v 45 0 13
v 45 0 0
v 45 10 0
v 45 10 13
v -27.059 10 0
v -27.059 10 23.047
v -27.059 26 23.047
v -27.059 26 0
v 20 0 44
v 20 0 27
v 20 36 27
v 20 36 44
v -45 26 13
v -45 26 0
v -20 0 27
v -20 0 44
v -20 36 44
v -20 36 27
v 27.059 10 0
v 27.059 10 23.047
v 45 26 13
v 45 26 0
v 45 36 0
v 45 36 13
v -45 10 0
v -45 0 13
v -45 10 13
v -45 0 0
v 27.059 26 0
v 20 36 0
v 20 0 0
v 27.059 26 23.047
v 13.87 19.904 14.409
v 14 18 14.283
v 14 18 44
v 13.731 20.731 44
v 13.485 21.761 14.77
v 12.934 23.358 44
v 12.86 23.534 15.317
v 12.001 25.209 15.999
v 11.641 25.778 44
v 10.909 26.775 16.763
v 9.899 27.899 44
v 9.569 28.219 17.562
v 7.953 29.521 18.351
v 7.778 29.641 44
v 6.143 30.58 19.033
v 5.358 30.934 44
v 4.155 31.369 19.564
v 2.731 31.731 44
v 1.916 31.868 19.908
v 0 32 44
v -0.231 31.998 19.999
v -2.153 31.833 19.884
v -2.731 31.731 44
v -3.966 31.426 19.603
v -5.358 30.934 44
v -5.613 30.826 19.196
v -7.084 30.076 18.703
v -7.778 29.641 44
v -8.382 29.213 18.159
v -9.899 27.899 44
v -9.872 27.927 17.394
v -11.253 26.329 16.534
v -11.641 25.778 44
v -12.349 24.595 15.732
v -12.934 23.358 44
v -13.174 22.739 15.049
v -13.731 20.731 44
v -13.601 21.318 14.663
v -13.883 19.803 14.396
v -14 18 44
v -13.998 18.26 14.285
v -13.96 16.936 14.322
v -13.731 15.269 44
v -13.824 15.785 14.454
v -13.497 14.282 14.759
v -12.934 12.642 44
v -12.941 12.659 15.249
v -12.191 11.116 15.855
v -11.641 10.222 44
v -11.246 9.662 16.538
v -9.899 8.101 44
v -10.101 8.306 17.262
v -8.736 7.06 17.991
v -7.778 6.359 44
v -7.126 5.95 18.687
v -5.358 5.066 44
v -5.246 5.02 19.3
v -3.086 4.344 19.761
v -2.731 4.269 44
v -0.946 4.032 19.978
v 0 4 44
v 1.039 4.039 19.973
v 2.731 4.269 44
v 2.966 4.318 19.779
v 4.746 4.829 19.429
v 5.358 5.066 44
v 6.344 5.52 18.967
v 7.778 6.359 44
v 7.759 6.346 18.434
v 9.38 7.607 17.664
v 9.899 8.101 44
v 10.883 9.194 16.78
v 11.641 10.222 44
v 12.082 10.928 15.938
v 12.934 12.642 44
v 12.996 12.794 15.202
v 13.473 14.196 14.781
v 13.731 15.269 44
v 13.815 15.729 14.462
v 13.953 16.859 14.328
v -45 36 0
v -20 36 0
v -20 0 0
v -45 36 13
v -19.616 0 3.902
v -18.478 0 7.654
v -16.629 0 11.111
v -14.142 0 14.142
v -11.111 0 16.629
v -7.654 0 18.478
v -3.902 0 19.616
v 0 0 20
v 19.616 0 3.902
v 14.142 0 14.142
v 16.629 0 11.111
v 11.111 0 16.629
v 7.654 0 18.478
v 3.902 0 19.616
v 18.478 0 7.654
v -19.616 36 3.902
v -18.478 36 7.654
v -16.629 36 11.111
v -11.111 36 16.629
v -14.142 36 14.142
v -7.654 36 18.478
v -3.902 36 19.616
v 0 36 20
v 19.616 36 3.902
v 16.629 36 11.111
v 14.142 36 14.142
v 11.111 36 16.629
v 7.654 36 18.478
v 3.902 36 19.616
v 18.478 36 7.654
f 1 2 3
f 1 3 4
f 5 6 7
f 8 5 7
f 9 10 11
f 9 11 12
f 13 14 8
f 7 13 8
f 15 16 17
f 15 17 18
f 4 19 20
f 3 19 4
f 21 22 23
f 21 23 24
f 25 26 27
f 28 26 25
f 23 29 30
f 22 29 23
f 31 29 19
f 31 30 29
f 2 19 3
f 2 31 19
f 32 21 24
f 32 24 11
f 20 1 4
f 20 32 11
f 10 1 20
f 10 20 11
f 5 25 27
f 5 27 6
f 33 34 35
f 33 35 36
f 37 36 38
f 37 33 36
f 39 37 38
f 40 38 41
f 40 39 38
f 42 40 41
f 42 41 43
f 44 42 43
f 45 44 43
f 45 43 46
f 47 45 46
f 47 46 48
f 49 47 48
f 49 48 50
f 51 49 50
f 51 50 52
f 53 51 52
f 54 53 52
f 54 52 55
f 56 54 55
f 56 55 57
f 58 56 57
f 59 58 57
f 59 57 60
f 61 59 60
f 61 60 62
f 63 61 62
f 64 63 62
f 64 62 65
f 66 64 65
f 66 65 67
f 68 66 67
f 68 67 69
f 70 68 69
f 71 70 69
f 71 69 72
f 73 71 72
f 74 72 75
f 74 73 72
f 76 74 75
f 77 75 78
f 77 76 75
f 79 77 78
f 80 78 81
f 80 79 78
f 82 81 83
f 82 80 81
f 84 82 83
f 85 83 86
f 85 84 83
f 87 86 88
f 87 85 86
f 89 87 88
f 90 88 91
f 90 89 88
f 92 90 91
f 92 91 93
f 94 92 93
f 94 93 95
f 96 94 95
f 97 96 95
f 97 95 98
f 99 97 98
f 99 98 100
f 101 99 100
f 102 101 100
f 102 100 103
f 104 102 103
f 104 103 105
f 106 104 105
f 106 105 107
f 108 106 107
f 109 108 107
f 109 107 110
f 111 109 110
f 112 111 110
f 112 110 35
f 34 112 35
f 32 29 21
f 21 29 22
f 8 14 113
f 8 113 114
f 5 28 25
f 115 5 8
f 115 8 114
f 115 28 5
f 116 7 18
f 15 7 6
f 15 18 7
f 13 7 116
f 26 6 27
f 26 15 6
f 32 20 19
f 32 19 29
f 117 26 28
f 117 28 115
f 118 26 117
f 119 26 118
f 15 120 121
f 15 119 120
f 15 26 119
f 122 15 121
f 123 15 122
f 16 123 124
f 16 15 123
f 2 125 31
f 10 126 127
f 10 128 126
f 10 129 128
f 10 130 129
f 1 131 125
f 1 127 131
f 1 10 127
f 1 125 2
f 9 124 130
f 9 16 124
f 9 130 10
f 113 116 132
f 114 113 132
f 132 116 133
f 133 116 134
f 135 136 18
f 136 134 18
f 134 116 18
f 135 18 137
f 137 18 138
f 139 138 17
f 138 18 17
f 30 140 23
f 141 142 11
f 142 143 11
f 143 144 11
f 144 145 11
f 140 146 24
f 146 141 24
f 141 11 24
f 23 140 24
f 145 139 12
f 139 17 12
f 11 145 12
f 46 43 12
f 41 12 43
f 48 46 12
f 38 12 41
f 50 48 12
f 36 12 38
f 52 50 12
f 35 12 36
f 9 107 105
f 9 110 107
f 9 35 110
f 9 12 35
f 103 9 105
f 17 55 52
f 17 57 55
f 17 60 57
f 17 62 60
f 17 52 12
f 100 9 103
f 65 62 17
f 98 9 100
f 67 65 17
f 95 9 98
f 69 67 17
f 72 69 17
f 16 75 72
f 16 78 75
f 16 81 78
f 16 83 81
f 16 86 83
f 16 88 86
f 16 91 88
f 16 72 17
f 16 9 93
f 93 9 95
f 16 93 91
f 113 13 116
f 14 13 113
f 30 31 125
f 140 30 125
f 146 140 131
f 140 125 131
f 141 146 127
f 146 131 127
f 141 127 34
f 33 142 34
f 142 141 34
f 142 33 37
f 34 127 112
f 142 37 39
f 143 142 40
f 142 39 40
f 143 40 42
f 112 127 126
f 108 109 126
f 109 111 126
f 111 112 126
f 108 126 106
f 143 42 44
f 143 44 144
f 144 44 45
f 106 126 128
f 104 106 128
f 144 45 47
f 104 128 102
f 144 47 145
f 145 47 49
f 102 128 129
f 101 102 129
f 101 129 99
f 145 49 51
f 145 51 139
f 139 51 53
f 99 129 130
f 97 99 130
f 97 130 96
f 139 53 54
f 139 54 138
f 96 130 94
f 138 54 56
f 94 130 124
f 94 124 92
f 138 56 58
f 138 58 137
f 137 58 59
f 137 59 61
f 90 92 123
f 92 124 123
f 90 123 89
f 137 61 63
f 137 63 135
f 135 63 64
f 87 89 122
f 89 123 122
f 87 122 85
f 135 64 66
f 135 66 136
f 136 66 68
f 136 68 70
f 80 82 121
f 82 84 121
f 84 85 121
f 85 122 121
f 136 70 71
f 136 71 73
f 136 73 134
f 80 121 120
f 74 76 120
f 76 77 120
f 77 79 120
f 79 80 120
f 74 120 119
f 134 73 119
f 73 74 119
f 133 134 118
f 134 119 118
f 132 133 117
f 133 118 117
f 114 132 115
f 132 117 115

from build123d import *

# Parameters (mm, degrees)
F1_DEPTH = 36
F3_DEPTH = 36
F4_R     = 14
F4_W     = 18
F4_H     = 16
F5_DEPTH = 44


with BuildPart() as f1:
    # F0 (on Front) → F1 (new body)
    with BuildSketch(Plane.XZ):
        Polygon((0, 44), (0, 0), (45, 0), (45, 13), (20, 27), (20, 44), align=None)
        Polygon((-45, 0), (0, 0), (0, 44), (-20, 44), (-20, 27), (-45, 13), align=None)
    extrude(amount=-F1_DEPTH)

    # F2 (on face) → F3 (cut)
    with BuildSketch(Plane.XZ):
        with BuildLine():
            Line((-20, 0), (20, 0))
            ThreePointArc((20, 0), (0, 20), (-20, 0))
        make_face()
    extrude(amount=-F3_DEPTH, mode=Mode.SUBTRACT)

    # F4 (on Top) → F5 (cut)
    with BuildSketch(Plane.XY):
        with Locations((0, 18)):
            Circle(F4_R)
        with Locations((-36.059196651, 18)):
            Rectangle(F4_W, F4_H)
        with Locations((36.059196651, 18)):
            Rectangle(F4_W, F4_H)
    extrude(amount=F5_DEPTH, mode=Mode.SUBTRACT)


solid = f1.part
